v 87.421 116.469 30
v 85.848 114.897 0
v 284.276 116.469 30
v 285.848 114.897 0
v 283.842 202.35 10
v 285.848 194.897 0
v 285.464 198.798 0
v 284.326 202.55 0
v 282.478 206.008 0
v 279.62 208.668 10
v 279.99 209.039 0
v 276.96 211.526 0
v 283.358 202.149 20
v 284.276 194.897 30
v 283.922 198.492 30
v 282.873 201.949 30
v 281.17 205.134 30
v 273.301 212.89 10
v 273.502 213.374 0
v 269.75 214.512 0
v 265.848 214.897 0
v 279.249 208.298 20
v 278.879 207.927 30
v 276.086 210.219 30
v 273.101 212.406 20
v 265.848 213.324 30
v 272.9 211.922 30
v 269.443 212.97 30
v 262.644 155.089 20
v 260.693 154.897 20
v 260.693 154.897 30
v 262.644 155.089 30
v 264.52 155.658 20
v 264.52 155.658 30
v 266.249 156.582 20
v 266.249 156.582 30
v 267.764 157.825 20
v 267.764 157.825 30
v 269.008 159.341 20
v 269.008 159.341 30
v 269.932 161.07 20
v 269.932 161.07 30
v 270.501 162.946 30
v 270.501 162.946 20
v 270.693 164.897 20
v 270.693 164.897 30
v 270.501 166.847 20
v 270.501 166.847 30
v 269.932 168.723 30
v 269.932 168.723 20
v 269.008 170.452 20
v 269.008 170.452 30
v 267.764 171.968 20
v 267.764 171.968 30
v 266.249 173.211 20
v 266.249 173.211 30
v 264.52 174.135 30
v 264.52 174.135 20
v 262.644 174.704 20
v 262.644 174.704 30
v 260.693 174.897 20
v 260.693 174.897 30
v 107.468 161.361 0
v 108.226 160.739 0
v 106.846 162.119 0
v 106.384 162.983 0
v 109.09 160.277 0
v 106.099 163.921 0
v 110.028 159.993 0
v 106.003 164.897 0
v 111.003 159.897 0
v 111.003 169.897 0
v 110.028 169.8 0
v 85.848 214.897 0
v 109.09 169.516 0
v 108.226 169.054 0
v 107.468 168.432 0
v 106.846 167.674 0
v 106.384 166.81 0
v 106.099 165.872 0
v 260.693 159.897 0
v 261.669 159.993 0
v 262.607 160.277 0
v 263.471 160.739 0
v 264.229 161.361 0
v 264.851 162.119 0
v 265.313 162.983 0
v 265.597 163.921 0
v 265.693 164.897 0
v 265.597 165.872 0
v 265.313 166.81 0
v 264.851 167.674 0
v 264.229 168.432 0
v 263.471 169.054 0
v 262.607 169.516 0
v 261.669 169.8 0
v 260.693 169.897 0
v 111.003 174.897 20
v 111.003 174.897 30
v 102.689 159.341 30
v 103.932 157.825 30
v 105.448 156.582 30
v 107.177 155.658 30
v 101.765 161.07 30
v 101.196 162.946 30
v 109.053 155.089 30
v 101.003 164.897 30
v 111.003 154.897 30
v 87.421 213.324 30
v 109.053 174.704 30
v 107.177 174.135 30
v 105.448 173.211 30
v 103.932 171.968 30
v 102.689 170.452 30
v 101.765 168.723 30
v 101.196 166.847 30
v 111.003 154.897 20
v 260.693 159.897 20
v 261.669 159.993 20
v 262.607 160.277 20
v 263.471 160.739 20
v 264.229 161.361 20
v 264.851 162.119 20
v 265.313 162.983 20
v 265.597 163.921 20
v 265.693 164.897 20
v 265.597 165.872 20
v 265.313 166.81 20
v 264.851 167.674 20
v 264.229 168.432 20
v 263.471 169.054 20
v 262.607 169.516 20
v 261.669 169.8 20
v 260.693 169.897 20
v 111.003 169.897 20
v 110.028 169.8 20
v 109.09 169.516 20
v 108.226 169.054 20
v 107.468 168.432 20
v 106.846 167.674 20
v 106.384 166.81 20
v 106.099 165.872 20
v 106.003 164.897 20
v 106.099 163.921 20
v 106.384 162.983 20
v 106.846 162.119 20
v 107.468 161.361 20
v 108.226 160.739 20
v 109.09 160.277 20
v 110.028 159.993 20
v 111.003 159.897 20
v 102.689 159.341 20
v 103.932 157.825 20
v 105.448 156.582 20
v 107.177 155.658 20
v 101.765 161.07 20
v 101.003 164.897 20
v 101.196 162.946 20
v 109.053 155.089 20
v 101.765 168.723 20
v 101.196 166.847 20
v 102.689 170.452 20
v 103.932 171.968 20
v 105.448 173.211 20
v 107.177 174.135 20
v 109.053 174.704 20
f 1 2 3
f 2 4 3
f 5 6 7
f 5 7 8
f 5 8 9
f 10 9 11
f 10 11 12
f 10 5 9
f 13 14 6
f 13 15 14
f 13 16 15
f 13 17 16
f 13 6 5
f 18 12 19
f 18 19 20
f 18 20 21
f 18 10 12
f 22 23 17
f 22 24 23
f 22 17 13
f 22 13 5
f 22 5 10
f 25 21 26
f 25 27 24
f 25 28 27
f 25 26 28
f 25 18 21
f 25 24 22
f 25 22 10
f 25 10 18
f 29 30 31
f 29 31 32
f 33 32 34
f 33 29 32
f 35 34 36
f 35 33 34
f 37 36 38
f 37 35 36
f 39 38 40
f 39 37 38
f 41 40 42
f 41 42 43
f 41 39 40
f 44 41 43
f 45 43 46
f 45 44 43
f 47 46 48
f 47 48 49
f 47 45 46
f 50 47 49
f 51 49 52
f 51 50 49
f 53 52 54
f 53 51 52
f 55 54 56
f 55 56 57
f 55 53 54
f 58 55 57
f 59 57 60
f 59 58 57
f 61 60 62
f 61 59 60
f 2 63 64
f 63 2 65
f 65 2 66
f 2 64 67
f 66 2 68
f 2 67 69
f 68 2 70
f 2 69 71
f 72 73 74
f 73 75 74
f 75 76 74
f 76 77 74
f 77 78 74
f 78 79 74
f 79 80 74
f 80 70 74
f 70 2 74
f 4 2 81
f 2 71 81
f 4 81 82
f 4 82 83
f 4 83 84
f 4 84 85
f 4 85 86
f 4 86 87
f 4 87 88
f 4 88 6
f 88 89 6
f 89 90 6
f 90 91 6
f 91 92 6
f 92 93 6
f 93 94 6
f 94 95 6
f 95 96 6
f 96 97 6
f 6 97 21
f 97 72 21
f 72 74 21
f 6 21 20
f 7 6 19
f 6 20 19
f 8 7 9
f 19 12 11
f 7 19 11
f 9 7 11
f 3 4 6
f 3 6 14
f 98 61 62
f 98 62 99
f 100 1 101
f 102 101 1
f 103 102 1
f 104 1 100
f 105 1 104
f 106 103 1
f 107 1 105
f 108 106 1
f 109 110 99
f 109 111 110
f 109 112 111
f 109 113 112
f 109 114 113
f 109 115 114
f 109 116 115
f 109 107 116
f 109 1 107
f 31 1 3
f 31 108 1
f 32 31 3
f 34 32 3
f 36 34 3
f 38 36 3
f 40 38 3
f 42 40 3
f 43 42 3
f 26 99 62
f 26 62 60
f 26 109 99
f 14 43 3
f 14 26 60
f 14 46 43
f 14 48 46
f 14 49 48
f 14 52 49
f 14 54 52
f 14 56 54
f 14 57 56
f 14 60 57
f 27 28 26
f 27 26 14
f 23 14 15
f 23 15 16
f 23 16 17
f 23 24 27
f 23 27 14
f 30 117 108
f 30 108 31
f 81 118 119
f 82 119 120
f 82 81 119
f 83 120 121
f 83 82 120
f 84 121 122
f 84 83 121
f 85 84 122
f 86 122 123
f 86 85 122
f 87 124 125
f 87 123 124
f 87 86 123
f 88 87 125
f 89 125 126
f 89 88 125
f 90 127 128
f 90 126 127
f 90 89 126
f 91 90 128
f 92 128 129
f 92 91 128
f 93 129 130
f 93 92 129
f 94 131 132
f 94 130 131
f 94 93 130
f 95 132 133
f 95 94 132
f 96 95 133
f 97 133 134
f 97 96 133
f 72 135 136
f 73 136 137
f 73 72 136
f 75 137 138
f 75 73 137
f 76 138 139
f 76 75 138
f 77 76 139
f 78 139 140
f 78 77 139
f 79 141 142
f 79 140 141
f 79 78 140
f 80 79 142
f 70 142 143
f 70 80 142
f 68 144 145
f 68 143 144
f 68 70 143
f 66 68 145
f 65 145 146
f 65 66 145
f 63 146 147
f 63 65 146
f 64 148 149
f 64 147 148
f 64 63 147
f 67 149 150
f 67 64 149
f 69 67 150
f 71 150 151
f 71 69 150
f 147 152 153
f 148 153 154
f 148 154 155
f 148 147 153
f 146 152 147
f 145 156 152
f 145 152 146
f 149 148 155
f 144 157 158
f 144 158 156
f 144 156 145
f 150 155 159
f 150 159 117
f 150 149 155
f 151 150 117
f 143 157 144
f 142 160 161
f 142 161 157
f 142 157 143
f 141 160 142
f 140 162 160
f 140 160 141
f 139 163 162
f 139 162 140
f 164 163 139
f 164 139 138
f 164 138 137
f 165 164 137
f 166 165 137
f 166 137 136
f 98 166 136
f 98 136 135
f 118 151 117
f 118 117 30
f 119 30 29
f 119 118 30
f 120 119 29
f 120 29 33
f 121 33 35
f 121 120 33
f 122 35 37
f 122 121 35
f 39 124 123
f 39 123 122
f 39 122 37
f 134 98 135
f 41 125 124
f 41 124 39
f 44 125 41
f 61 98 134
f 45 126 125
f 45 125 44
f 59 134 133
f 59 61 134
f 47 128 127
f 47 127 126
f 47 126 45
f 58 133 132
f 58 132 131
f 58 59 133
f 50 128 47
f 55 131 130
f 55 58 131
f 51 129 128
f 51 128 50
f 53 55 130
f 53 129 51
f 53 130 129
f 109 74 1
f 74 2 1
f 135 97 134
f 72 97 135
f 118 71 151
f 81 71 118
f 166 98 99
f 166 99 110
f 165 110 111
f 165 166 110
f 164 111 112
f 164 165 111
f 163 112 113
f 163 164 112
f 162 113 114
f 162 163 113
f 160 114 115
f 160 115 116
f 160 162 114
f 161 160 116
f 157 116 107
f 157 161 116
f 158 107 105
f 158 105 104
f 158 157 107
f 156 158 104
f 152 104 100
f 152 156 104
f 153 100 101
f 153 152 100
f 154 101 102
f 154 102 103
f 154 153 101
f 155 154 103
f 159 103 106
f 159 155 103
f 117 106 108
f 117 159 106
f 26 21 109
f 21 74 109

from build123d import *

# Parameters (mm, degrees)
F1_DEPTH = 30
F1_TAPER = 3
F2_DEPTH = 30
F3_START = 20
F3_DEPTH = 10


with BuildPart() as f1:
    # F0 (on Top) → F1 (new body)
    with BuildSketch(Plane.XY):
        with BuildLine():
            Line((265.848302468, 214.8965468303), (85.848302468, 214.8965468303))
            Line((85.848302468, 214.8965468303), (85.848302468, 114.8965468303))
            Line((85.848302468, 114.8965468303), (285.848302468, 114.8965468303))
            Line((285.848302468, 114.8965468303), (285.848302468, 194.8965468303))
            ThreePointArc((285.848302468, 194.8965468303), (279.9904380917, 209.0386824541), (265.848302468, 214.8965468303))
        make_face()
        with BuildLine():
            Line((260.6931902693, 154.8965468303), (111.0034146666, 154.8965468303))
            ThreePointArc((111.0034146666, 154.8965468303), (101.0034146666, 164.8965468303), (111.0034146666, 174.8965468303))
            Line((111.0034146666, 174.8965468303), (260.6931902693, 174.8965468303))
            ThreePointArc((260.6931902693, 174.8965468303), (270.6931902693, 164.8965468303), (260.6931902693, 154.8965468303))
        make_face(mode=Mode.SUBTRACT)
        with BuildLine():
            ThreePointArc((111.0034146666, 174.8965468303), (101.0034146666, 164.8965468303), (111.0034146666, 154.8965468303))
            Line((111.0034146666, 154.8965468303), (260.6931902693, 154.8965468303))
            ThreePointArc((260.6931902693, 154.8965468303), (270.6931902693, 164.8965468303), (260.6931902693, 174.8965468303))
            Line((260.6931902693, 174.8965468303), (111.0034146666, 174.8965468303))
        make_face()
        with BuildLine():
            Line((260.6931902693, 159.8965468303), (111.0034146666, 159.8965468303))
            ThreePointArc((111.0034146666, 159.8965468303), (106.0034146666, 164.8965468303), (111.0034146666, 169.8965468303))
            Line((111.0034146666, 169.8965468303), (260.6931902693, 169.8965468303))
            ThreePointArc((260.6931902693, 169.8965468303), (265.6931902693, 164.8965468303), (260.6931902693, 159.8965468303))
        make_face(mode=Mode.SUBTRACT)
        with BuildLine():
            ThreePointArc((111.0034146666, 169.8965468303), (106.0034146666, 164.8965468303), (111.0034146666, 159.8965468303))
            Line((111.0034146666, 159.8965468303), (260.6931902693, 159.8965468303))
            ThreePointArc((260.6931902693, 159.8965468303), (265.6931902693, 164.8965468303), (260.6931902693, 169.8965468303))
            Line((260.6931902693, 169.8965468303), (111.0034146666, 169.8965468303))
        make_face()
    extrude(amount=F1_DEPTH, taper=F1_TAPER)

    # F0 (on Top) → F2 (cut)
    with BuildSketch(Plane.XY):
        with BuildLine():
            ThreePointArc((111.0034146666, 169.8965468303), (106.0034146666, 164.8965468303), (111.0034146666, 159.8965468303))
            Line((111.0034146666, 159.8965468303), (260.6931902693, 159.8965468303))
            ThreePointArc((260.6931902693, 159.8965468303), (265.6931902693, 164.8965468303), (260.6931902693, 169.8965468303))
            Line((260.6931902693, 169.8965468303), (111.0034146666, 169.8965468303))
        make_face()
    extrude(amount=F2_DEPTH, mode=Mode.SUBTRACT)

    # F0 (on Top) → F3 (cut)
    with BuildSketch(Plane.XY.offset(F3_START)):
        with BuildLine():
            ThreePointArc((111.0034146666, 174.8965468303), (101.0034146666, 164.8965468303), (111.0034146666, 154.8965468303))
            Line((111.0034146666, 154.8965468303), (260.6931902693, 154.8965468303))
            ThreePointArc((260.6931902693, 154.8965468303), (270.6931902693, 164.8965468303), (260.6931902693, 174.8965468303))
            Line((260.6931902693, 174.8965468303), (111.0034146666, 174.8965468303))
        make_face()
        with BuildLine():
            Line((260.6931902693, 159.8965468303), (111.0034146666, 159.8965468303))
            ThreePointArc((111.0034146666, 159.8965468303), (106.0034146666, 164.8965468303), (111.0034146666, 169.8965468303))
            Line((111.0034146666, 169.8965468303), (260.6931902693, 169.8965468303))
            ThreePointArc((260.6931902693, 169.8965468303), (265.6931902693, 164.8965468303), (260.6931902693, 159.8965468303))
        make_face(mode=Mode.SUBTRACT)
    extrude(amount=F3_DEPTH, mode=Mode.SUBTRACT)


solid = f1.part
